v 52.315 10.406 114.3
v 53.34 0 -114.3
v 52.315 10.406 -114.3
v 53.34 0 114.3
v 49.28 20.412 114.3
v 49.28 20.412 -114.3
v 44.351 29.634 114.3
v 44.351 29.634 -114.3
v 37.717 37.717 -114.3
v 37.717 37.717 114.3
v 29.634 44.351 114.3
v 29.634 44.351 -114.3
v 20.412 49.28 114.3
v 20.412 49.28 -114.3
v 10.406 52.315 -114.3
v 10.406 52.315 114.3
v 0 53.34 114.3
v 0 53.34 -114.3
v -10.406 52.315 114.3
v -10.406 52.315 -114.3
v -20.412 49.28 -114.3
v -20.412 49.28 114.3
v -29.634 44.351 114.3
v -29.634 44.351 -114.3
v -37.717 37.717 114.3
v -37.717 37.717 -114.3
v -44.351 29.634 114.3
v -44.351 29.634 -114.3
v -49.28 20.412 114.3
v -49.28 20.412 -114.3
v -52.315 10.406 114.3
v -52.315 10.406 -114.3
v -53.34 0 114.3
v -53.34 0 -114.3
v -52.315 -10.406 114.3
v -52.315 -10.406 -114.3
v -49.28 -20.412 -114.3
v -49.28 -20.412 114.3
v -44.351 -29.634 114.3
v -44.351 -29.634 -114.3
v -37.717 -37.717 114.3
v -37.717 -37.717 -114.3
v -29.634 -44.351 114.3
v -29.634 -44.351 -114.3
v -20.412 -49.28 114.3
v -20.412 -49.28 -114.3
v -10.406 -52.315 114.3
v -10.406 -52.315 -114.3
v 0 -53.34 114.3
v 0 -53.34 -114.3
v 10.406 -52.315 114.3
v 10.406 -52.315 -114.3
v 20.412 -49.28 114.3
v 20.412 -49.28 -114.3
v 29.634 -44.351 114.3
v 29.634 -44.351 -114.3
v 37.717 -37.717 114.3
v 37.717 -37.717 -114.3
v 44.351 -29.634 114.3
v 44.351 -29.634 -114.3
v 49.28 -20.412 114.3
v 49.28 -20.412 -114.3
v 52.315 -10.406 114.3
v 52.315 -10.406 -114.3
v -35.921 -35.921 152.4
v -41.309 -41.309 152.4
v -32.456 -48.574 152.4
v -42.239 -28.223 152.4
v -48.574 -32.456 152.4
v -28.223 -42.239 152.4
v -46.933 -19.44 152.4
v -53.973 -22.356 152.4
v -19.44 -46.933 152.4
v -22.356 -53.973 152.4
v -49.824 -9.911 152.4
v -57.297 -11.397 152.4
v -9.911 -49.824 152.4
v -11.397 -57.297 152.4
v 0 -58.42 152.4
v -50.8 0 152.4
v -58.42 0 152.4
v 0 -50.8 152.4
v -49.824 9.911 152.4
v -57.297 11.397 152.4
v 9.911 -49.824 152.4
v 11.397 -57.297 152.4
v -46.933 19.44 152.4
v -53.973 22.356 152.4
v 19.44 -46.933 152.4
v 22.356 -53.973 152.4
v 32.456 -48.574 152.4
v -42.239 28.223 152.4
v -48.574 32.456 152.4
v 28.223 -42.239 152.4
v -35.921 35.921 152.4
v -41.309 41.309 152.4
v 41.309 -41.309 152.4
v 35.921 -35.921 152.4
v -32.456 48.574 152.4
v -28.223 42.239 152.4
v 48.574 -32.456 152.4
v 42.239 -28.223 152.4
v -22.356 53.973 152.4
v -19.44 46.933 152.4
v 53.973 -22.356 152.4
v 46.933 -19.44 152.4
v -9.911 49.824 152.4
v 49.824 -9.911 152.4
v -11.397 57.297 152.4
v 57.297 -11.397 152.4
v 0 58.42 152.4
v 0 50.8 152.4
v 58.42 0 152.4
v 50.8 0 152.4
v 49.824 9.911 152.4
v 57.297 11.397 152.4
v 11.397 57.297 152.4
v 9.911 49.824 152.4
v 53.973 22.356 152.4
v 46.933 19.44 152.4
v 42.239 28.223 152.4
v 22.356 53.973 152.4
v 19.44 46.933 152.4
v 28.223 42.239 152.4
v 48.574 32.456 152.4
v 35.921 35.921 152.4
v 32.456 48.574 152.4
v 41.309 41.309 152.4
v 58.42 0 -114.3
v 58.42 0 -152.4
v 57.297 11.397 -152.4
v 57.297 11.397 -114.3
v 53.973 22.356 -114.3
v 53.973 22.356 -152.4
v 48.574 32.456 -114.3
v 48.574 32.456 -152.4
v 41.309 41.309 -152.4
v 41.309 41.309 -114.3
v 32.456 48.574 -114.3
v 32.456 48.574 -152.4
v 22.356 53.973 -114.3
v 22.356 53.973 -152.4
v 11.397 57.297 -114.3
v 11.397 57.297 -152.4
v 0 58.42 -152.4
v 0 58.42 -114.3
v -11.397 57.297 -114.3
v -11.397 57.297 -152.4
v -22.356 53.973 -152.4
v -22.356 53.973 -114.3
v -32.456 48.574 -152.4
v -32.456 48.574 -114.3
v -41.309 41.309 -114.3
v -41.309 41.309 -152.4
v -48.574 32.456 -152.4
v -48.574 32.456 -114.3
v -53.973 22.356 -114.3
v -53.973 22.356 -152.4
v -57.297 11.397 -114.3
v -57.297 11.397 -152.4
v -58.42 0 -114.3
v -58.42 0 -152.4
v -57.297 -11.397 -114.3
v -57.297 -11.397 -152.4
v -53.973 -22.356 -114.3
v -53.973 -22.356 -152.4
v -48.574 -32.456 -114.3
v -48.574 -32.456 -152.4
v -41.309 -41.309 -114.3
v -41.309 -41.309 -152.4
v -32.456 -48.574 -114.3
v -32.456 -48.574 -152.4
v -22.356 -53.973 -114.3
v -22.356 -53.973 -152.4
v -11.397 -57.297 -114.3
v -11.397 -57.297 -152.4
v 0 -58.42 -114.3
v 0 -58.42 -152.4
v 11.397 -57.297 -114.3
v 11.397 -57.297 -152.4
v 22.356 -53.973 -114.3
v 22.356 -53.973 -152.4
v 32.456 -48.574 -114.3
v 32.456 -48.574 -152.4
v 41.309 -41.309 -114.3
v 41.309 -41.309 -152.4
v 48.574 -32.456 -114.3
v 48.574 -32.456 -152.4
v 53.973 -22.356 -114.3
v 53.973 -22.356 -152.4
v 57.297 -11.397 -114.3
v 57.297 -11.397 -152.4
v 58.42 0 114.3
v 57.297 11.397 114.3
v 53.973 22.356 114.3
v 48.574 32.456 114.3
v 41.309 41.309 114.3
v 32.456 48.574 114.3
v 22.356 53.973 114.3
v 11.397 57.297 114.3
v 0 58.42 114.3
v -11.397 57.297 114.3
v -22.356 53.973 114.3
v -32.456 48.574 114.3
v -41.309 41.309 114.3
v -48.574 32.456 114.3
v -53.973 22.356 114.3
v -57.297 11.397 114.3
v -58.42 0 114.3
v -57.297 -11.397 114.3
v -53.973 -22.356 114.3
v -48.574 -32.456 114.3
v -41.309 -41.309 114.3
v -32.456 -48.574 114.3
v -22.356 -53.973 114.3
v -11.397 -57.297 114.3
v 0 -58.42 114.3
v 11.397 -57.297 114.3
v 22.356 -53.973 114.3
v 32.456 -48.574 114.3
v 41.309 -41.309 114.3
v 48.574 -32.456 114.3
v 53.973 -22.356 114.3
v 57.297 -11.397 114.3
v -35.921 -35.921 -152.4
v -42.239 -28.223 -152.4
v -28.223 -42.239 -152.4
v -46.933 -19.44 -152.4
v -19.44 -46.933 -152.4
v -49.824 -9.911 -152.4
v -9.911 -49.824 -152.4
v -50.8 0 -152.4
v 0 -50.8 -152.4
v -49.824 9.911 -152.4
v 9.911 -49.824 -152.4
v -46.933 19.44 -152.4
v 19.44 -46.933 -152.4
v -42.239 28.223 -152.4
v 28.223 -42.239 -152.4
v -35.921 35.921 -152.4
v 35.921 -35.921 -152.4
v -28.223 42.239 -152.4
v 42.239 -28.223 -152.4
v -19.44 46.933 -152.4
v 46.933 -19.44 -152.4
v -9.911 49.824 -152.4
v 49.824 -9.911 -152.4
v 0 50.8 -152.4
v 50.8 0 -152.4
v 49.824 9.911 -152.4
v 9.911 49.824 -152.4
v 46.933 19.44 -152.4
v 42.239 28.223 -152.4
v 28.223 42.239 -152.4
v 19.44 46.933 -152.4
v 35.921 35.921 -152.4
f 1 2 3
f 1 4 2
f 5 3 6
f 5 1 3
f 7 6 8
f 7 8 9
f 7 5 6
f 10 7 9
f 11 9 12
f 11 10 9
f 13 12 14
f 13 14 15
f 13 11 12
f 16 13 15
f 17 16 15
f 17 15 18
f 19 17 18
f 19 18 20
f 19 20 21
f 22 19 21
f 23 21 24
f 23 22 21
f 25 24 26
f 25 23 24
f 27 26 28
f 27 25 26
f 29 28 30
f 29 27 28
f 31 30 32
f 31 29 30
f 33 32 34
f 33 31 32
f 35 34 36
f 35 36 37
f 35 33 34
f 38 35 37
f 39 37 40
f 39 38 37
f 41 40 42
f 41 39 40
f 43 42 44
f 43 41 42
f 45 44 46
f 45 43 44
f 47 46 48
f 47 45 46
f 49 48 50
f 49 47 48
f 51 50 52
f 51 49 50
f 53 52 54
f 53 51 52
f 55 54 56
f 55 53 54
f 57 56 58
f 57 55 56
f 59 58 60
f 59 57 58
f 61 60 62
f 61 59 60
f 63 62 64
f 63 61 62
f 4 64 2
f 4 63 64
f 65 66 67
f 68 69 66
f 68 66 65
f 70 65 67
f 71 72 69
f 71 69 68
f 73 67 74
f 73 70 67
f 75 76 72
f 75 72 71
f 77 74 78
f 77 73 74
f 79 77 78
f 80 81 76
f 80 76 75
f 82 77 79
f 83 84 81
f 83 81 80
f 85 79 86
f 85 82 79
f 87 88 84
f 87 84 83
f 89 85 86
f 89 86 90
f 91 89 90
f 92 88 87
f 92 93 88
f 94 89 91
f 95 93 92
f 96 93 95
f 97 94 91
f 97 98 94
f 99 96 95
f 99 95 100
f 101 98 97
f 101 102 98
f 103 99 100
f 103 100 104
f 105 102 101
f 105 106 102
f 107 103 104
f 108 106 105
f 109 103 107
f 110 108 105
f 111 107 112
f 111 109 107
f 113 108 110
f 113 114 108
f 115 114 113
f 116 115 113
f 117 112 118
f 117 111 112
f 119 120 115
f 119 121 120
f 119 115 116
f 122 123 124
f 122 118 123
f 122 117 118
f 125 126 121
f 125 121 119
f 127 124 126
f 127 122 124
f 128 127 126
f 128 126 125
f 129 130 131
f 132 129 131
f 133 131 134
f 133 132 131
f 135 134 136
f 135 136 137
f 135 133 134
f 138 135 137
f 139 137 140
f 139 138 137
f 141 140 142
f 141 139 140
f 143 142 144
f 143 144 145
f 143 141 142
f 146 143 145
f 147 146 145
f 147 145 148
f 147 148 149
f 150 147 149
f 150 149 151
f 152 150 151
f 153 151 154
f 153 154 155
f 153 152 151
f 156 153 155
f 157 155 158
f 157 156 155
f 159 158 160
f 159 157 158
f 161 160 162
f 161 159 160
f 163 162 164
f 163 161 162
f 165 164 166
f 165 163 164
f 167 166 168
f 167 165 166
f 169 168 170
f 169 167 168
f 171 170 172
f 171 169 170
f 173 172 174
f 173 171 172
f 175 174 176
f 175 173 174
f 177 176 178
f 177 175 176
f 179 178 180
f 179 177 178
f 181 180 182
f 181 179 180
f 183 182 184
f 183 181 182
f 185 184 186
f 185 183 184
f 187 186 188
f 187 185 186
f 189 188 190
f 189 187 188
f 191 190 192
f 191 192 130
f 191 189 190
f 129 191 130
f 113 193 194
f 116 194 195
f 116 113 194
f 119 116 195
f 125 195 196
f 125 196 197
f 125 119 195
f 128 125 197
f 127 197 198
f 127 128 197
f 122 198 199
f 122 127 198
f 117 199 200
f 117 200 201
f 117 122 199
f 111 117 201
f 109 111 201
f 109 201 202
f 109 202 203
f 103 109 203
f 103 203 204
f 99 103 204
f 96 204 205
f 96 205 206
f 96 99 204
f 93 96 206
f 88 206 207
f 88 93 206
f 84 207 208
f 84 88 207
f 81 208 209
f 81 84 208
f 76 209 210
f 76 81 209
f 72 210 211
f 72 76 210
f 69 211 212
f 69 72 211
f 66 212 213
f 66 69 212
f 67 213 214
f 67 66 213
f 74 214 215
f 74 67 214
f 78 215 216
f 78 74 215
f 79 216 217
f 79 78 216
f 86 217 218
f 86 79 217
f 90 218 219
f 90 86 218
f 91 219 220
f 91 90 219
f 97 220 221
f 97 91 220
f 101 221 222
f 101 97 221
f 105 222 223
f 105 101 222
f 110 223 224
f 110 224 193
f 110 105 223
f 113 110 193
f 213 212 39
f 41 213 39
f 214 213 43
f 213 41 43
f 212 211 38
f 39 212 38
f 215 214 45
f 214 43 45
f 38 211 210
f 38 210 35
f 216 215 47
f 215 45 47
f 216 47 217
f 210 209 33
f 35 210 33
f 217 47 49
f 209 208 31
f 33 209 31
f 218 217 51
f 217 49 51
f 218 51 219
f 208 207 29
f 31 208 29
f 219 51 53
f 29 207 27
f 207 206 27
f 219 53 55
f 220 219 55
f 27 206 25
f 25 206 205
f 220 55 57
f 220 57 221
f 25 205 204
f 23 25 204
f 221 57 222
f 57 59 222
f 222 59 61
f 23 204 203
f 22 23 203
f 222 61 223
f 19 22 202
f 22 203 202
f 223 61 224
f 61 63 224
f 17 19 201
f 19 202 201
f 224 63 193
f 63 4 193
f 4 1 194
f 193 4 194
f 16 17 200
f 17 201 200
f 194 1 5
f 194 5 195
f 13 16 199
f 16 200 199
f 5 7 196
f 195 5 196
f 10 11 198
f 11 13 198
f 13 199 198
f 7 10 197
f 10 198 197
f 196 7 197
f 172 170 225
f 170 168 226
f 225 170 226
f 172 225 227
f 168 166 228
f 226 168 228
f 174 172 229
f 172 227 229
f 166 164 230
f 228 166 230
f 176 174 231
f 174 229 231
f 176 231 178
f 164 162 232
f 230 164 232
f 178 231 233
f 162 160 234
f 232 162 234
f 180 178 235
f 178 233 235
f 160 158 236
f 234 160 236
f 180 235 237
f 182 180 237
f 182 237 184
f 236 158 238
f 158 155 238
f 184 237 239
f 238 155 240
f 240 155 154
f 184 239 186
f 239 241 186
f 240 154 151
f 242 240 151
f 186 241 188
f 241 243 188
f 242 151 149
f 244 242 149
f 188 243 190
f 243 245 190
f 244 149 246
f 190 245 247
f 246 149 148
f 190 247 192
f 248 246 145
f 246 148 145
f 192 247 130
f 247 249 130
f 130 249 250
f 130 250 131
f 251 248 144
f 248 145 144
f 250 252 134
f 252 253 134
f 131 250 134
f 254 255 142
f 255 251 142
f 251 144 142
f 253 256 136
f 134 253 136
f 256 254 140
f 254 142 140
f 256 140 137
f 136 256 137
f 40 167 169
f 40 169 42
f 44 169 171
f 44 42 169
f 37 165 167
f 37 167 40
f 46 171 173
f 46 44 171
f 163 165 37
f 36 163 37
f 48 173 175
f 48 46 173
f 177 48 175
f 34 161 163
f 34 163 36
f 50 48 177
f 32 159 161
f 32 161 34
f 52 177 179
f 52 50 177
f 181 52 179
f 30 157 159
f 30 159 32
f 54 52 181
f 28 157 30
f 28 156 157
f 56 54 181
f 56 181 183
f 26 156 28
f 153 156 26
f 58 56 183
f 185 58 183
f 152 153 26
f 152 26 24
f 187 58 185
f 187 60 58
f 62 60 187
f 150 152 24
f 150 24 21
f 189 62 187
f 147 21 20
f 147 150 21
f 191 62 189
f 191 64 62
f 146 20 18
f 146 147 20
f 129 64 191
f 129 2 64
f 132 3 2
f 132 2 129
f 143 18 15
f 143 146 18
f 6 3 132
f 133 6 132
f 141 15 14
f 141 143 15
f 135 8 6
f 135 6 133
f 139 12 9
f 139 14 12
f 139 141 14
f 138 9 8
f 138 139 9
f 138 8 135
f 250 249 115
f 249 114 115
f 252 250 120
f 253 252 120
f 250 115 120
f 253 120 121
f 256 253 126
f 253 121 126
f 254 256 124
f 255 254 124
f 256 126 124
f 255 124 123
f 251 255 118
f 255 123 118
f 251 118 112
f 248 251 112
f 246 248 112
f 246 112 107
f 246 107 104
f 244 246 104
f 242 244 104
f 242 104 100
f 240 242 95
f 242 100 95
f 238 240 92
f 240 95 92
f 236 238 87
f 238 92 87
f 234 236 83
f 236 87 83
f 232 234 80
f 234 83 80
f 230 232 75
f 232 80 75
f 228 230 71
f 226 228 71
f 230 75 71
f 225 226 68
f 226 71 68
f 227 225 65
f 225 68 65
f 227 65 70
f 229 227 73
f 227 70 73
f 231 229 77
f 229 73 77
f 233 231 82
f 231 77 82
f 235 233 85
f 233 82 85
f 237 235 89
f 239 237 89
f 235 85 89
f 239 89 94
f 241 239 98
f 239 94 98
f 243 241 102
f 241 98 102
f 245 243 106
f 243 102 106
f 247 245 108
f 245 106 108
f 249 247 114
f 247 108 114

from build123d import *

# Parameters (mm, degrees)
F0_R     = 58.42
F3_DEPTH = 152.4
F4_DEPTH = 114.3
F1_R     = 53.34
F5_DEPTH = 114.3
F2_R     = 50.8
F6_DEPTH = 152.4


with BuildPart() as f3:
    # F0 (on Top) → F3 (new body, symmetric)
    with BuildSketch(Plane.XY):
        Circle(F0_R)
    extrude(amount=F3_DEPTH, both=True)

    # F0 (on Top) → F4 (cut, symmetric)
    with BuildSketch(Plane.XY):
        Circle(F0_R)
    extrude(amount=F4_DEPTH, both=True, mode=Mode.SUBTRACT)

    # F1 (on Top) → F5 (join, symmetric)
    with BuildSketch(Plane.XY):
        Circle(F1_R)
    extrude(amount=F5_DEPTH, both=True)

    # F2 (on Top) → F6 (cut, symmetric)
    with BuildSketch(Plane.XY):
        Circle(F2_R)
    extrude(amount=F6_DEPTH, both=True, mode=Mode.SUBTRACT)


solid = f3.part
